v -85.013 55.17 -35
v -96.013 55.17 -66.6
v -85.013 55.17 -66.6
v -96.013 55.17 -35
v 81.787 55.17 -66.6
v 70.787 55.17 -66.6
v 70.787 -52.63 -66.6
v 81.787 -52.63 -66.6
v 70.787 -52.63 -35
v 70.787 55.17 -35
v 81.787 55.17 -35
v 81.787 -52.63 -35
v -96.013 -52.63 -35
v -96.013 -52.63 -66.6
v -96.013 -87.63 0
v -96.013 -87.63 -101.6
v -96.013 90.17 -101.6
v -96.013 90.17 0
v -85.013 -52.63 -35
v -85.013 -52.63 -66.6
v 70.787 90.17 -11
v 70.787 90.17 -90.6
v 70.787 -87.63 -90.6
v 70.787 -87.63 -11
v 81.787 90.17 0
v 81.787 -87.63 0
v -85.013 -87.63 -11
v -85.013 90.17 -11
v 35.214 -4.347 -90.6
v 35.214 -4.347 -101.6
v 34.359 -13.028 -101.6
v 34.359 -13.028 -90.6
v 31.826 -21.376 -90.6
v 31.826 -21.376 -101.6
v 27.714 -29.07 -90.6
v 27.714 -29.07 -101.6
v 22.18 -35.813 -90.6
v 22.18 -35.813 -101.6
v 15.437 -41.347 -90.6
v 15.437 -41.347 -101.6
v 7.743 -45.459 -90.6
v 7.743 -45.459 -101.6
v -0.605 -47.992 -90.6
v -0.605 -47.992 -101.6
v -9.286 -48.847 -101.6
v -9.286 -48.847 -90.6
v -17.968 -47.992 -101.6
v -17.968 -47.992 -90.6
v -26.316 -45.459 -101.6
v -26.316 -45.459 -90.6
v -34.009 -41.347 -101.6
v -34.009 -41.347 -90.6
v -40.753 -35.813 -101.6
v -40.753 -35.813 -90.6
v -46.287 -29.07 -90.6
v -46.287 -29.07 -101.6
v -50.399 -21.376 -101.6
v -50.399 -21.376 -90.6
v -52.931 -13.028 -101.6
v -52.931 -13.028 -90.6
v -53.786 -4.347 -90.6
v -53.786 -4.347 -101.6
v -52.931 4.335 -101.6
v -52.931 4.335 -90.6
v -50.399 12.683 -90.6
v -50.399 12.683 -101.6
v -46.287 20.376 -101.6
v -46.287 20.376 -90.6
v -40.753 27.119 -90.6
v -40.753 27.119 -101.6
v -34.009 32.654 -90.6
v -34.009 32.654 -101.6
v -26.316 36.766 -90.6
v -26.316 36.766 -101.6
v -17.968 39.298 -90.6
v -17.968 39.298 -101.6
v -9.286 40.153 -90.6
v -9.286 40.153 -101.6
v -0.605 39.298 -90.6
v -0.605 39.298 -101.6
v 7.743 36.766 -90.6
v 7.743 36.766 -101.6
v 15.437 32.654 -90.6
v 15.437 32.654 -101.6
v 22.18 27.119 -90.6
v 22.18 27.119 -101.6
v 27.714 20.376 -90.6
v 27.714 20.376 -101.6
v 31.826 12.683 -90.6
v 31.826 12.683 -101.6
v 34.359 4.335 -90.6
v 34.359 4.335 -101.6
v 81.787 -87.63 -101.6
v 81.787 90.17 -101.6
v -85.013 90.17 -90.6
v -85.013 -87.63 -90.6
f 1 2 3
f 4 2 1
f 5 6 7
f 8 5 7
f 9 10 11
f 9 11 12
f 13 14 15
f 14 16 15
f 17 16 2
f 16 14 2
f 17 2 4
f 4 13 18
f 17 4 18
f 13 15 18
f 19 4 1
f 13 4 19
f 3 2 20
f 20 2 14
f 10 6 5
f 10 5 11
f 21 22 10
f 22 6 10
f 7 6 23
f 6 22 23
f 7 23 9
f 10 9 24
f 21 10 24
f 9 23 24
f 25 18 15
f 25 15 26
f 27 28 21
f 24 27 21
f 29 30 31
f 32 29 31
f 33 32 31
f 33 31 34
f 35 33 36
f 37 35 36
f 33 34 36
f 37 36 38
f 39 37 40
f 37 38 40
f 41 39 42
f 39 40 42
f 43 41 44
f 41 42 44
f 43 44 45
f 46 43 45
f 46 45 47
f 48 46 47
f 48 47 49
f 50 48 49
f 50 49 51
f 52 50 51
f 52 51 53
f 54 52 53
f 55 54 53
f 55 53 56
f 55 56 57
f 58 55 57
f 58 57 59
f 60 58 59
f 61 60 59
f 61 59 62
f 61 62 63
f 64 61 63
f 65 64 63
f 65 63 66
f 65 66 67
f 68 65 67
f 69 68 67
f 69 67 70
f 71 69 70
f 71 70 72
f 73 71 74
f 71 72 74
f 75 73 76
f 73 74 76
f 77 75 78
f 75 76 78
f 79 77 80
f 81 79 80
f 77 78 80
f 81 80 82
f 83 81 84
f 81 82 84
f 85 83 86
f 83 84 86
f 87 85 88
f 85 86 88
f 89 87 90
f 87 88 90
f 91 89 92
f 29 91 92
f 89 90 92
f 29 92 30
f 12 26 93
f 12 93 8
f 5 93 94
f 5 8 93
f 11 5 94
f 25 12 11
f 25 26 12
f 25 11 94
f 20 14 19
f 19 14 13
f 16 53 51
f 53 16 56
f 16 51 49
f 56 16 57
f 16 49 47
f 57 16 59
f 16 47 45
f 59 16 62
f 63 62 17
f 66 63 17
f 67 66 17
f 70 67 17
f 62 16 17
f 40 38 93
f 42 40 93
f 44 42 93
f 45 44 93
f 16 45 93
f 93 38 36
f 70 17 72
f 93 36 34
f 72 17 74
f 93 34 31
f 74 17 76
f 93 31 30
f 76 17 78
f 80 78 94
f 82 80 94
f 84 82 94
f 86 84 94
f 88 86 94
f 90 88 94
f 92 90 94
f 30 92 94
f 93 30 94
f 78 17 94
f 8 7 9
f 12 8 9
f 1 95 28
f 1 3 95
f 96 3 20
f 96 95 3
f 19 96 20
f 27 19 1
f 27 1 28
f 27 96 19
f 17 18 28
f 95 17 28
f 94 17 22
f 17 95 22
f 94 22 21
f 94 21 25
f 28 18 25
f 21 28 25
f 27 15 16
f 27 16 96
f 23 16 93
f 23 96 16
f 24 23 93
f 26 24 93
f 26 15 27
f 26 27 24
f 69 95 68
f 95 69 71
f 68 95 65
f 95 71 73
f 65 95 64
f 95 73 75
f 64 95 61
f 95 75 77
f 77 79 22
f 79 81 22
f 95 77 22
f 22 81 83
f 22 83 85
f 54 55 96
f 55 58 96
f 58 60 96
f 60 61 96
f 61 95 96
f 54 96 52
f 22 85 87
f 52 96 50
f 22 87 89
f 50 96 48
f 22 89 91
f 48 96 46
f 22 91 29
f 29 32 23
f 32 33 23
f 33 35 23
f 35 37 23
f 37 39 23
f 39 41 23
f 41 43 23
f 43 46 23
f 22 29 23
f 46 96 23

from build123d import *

# Parameters (mm, degrees)
F0_W     = 177.8
F0_H     = 177.8
F1_DEPTH = 101.6
F2_W     = 155.8
F2_H     = 79.6
F3_DEPTH = 177.801
F4_W     = 107.8
F4_H     = 31.6
F5_DEPTH = 177.801
F6_R     = 44.5
F7_DEPTH = 25


with BuildPart() as f1:
    # F0 (on Top) → F1 (new body)
    with BuildSketch(Plane.XY):
        with Locations((-7.112902, 1.270162)):
            Rectangle(F0_W, F0_H)
    extrude(amount=-F1_DEPTH)

    # F2 (on face) → F3 (cut, through all)
    with BuildSketch(Plane.XZ.offset(87.629838)):
        with Locations((-7.112902, -50.8)):
            Rectangle(F2_W, F2_H)
    extrude(amount=-F3_DEPTH, mode=Mode.SUBTRACT)

    # F4 (on face) → F5 (cut, through all)
    with BuildSketch(Plane(origin=(-96.012902, 0, 0), x_dir=(0, -1, 0), z_dir=(-1, 0, 0))):
        with Locations((-1.270162, -50.8)):
            Rectangle(F4_W, F4_H)
    extrude(amount=-F5_DEPTH, mode=Mode.SUBTRACT)

    # F6 (on face) → F7 (cut)
    with BuildSketch(Plane(origin=(0, 0, -101.6), x_dir=(1, 0, 0), z_dir=(0, 0, -1))):
        with Locations((-9.286336, 4.346757)):
            Circle(F6_R)
    extrude(amount=-F7_DEPTH, mode=Mode.SUBTRACT)


solid = f1.part
